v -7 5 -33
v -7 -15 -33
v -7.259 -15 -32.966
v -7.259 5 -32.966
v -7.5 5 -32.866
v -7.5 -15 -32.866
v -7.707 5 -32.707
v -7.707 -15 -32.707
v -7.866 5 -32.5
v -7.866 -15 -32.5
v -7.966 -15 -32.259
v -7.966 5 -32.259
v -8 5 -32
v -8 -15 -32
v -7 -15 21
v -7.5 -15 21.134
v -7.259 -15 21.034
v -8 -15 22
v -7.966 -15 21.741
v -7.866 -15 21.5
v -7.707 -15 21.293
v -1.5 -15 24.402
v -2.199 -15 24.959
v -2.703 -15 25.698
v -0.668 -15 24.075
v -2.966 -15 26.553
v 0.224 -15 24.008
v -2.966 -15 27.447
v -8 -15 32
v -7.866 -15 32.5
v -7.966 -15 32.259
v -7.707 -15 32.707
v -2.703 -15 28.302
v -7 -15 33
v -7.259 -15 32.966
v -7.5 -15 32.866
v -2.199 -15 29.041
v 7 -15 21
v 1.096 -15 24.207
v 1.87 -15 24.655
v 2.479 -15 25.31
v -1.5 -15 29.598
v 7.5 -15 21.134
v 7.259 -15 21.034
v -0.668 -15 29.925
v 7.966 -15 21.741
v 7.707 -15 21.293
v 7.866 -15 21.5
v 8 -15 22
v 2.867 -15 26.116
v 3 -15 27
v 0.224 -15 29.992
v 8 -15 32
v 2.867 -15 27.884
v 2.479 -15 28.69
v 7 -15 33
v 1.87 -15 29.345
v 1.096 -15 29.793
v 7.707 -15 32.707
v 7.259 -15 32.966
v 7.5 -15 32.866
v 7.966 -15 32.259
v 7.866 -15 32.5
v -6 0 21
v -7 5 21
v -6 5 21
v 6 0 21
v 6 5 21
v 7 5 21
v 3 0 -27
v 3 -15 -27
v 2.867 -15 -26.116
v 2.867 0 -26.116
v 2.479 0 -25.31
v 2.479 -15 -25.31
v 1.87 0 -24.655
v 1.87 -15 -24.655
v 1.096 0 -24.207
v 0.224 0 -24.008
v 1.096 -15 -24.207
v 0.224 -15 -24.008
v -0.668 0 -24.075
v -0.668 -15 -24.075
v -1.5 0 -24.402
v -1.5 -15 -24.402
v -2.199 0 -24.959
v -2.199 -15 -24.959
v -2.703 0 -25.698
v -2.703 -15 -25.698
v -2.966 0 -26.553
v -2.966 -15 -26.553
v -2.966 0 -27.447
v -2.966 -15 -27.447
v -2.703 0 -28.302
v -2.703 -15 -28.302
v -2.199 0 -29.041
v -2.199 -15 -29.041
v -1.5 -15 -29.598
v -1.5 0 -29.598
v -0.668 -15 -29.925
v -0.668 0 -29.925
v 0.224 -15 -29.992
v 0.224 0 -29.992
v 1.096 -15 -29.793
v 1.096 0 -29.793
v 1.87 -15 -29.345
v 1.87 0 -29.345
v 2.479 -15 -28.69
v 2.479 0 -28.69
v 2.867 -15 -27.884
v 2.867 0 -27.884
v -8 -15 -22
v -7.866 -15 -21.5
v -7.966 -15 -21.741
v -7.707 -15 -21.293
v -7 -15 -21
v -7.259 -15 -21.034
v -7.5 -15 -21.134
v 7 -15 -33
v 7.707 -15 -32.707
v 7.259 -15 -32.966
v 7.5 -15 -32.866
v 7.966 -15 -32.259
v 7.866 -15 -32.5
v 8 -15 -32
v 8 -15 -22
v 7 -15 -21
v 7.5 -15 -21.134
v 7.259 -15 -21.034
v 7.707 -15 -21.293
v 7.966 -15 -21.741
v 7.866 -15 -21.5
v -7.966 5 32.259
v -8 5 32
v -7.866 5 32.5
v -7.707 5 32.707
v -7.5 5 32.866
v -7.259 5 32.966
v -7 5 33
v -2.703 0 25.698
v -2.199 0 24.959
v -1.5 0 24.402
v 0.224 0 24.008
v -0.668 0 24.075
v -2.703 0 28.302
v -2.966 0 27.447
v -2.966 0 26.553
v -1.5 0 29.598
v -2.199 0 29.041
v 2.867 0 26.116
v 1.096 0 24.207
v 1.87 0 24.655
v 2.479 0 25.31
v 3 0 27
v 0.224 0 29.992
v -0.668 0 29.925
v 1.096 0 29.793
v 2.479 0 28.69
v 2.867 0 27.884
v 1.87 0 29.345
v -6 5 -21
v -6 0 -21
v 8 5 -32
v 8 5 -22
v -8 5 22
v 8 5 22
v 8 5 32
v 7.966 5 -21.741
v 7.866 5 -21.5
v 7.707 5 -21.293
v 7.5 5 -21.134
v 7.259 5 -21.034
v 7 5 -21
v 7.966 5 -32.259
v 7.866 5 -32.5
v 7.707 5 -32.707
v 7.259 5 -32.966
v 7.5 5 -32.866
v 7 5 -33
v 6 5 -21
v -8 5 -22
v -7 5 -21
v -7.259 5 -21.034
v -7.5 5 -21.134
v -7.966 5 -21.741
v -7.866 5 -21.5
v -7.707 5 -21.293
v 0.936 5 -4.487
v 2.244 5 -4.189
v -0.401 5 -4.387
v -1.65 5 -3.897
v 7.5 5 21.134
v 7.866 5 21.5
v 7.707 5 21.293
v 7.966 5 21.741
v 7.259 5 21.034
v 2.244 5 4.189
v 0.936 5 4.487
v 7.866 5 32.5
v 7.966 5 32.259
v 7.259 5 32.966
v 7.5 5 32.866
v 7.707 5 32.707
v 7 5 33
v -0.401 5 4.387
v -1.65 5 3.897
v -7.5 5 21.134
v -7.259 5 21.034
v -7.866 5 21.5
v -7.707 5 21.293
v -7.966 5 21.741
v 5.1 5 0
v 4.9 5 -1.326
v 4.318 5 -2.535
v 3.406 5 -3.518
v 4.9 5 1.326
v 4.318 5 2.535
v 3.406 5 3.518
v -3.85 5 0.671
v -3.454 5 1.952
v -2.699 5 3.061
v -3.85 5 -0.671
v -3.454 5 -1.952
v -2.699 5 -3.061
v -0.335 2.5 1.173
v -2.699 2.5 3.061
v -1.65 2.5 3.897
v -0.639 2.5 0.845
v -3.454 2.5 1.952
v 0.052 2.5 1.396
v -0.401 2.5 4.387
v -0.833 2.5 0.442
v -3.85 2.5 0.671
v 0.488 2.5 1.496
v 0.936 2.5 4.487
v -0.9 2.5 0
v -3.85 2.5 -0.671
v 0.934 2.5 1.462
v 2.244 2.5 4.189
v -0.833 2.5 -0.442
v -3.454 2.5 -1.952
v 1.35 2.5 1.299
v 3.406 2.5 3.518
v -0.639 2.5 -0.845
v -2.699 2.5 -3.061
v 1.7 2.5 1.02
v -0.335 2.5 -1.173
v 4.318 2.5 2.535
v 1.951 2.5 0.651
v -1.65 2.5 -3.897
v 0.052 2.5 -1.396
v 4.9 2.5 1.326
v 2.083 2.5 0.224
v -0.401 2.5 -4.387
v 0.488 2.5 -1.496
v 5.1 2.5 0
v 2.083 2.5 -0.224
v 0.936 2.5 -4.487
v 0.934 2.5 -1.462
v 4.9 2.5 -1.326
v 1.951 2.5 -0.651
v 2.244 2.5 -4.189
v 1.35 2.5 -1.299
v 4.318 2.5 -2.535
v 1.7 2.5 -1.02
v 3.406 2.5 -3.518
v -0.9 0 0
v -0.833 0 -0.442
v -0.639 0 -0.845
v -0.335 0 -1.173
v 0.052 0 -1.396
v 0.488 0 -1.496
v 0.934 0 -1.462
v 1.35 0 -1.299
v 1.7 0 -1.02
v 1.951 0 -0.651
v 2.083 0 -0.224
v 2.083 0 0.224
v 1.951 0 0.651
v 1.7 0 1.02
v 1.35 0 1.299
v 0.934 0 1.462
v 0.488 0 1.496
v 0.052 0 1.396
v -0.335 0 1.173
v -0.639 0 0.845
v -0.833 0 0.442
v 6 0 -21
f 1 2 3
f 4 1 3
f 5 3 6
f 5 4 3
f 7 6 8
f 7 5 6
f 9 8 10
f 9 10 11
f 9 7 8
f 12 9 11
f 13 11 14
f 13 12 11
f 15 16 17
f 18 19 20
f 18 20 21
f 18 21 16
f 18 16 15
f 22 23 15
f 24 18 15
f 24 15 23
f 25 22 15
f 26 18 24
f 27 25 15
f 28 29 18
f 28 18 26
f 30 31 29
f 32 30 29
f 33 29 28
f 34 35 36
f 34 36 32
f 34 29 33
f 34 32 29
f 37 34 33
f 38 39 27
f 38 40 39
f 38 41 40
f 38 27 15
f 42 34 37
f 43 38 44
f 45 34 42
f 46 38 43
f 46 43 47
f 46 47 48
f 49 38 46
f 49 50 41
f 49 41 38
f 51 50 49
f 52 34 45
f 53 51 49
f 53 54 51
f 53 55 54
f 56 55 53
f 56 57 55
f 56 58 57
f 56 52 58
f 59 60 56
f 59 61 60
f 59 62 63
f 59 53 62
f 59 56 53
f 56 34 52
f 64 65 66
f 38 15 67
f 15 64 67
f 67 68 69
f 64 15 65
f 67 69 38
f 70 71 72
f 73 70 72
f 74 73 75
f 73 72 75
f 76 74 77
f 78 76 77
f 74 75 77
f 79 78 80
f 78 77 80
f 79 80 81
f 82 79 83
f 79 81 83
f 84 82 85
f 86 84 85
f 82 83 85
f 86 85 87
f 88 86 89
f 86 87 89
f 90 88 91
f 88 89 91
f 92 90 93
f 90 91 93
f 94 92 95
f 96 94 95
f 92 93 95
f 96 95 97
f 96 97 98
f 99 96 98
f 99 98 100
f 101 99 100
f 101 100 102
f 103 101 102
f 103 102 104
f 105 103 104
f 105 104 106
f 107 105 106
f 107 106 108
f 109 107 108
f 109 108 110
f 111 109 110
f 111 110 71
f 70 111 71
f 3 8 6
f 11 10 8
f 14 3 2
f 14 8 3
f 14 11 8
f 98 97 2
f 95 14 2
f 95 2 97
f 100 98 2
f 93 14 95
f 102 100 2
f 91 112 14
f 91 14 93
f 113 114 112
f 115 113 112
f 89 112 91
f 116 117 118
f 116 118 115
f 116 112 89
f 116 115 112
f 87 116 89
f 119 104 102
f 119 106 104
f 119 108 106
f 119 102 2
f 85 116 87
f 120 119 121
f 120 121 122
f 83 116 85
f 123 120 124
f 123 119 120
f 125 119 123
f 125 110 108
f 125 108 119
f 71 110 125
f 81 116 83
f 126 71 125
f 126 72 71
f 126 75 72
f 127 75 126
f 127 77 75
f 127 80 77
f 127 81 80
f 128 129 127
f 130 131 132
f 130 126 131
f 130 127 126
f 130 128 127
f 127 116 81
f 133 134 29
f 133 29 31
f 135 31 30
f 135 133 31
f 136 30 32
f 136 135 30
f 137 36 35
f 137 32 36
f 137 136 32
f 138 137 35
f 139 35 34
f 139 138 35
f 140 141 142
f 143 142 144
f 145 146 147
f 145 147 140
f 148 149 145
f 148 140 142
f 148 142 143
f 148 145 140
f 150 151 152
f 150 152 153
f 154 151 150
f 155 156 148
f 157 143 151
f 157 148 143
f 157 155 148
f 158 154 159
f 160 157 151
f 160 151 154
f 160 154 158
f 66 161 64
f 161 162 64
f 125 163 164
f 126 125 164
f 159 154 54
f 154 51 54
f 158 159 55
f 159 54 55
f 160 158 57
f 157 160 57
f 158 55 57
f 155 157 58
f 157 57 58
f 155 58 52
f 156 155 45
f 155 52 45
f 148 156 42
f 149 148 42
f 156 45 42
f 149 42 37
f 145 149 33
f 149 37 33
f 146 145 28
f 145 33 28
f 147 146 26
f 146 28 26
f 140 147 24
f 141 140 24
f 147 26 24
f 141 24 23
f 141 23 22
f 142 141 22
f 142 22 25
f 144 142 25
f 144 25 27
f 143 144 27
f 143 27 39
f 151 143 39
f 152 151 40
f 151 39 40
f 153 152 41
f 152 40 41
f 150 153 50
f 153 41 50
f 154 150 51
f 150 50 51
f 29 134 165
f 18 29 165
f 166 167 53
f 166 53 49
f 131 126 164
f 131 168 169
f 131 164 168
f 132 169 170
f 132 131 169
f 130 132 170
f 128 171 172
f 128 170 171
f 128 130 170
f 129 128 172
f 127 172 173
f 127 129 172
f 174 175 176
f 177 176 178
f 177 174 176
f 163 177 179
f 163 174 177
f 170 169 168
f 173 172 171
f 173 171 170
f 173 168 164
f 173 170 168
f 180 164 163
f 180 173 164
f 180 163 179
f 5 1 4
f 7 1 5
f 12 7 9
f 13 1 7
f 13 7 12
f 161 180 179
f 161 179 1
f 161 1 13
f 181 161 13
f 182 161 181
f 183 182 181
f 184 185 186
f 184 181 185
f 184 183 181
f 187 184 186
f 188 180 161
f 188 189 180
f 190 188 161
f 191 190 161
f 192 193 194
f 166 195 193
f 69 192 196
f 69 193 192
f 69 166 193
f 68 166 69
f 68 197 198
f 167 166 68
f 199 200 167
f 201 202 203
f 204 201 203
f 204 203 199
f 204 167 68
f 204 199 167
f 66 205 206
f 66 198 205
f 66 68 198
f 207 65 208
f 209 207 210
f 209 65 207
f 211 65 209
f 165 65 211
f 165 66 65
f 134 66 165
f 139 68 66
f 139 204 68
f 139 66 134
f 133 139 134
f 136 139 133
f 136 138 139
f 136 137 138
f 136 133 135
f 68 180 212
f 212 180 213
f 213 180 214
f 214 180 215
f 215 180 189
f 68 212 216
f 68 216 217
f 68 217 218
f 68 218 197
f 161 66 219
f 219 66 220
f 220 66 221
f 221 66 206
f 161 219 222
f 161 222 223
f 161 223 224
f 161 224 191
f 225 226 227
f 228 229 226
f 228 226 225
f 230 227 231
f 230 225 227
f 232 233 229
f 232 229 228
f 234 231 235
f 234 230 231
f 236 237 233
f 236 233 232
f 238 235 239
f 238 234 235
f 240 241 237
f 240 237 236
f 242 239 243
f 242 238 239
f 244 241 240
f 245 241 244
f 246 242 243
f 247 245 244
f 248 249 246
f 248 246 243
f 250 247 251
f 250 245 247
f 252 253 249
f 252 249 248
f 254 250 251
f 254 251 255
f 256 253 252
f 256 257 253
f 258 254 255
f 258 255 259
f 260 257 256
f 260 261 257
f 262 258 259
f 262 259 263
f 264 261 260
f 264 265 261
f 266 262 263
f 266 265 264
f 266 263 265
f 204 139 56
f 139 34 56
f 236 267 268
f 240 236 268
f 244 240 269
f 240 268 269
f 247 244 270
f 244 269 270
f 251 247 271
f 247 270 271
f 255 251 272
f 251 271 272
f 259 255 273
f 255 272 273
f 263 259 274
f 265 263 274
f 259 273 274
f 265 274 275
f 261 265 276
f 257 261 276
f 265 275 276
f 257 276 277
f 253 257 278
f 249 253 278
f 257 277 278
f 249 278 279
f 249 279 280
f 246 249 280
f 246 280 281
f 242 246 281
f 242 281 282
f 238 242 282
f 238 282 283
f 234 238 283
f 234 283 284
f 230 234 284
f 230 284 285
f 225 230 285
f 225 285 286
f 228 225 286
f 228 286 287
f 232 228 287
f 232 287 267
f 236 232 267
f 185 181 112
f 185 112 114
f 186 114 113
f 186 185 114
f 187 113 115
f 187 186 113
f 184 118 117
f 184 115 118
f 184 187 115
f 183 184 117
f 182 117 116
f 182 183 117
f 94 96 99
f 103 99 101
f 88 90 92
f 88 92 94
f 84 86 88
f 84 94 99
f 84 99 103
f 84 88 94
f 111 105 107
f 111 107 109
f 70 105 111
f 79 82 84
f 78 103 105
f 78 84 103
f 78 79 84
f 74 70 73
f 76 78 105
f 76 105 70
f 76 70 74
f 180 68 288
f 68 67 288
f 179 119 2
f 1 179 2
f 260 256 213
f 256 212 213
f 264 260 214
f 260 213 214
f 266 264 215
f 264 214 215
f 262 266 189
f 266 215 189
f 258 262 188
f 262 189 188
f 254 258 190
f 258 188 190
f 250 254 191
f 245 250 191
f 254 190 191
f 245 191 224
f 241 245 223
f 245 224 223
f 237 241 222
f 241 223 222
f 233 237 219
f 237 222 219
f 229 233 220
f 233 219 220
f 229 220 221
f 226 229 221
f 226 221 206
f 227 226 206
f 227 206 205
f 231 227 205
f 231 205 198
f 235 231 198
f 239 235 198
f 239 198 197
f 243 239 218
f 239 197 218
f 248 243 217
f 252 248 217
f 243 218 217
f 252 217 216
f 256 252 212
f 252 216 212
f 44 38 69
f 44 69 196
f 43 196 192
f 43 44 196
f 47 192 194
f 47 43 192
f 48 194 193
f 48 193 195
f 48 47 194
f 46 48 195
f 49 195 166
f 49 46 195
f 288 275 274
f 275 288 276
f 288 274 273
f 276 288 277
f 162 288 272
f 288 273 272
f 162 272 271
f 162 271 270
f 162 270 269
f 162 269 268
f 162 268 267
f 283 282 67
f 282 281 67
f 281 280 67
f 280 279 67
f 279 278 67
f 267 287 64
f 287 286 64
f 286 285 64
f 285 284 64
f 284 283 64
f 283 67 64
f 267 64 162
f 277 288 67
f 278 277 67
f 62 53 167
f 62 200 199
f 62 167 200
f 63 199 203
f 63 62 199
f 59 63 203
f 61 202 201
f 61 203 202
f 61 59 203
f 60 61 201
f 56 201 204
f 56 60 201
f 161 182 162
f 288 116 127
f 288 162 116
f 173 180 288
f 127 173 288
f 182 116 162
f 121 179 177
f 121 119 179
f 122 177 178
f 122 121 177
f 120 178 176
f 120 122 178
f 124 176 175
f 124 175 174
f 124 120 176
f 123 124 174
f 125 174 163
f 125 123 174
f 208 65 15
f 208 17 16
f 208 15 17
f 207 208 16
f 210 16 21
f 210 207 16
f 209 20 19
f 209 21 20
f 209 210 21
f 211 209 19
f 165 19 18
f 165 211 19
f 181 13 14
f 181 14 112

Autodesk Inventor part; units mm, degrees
ref_plane "YZ Plane" through (0, 0, 0) normal (1, 0, 0) x (0, 1, 0)
ref_plane "XZ Plane" through (0, 0, 0) normal (0, 1, 0) x (-1, 0, 0)
ref_plane "XY Plane" through (0, 0, 0) normal (0, 0, 1) x (1, 0, 0)
sketch "Эскиз1" plane through (0, 0, 0) normal (0, 1, 0) x (-1, 0, 0)
  line L0 (-6, -33) -> (6, -33)
  line L1 (6, -33) -> (6, 33)
  line L2 (6, 33) -> (-6, 33)
  line L3 (-6, 33) -> (-6, -33)
  line L4 (-6, -33) -> (6, 33) construction
  line L5 (6, -33) -> (-6, 33) construction
  circle A0 centre (-0.6, 0) radius 1.5
  point P0 (0, 0)
  dimension "d0" = 12
  dimension "d1" = 66
  dimension "d21" = 3
  dimension "d22" = 0.6
  dimension "d23" = 33
extrude "Выдавливание1" add sketch "Эскиз1" along normal blind 5
sketch "Эскиз2" plane through (0, 0, 0) normal (0, -1, 0) x (1, 0, 0)
  line L0 (-3, -33) -> (-8, -33)
  line L1 (-8, -33) -> (-8, -21)
  line L2 (-8, -21) -> (-3, -21)
  line L3 (-3, -21) -> (-3, -33) construction
  line L4 (-6, -33) -> (-6, 33) projected
  line L5 (6, -33) -> (-6, -33) projected
  line L6 (-6, 0) -> (6, 0) construction
  line L7 (6, 33) -> (6, -33) projected
  line L8 (0, -33) -> (0, 33) construction
  line L9 (-6, 33) -> (6, 33) projected
  line L10 (-3, 33) -> (-8, 33)
  line L11 (-8, 33) -> (-8, 21)
  line L12 (-8, 21) -> (-3, 21)
  line L13 (-3, 21) -> (-3, 33) construction
  line L14 (3, -33) -> (8, -33)
  line L15 (8, -33) -> (8, -21)
  line L16 (8, -21) -> (3, -21)
  line L17 (3, -21) -> (3, -33) construction
  line L18 (8, 21) -> (3, 21)
  line L19 (8, 33) -> (8, 21)
  line L20 (3, 33) -> (8, 33)
  line L21 (3, 21) -> (3, 33) construction
  line L22 (-3, -33) -> (3, -33)
  line L23 (-3, -21) -> (3, -21)
  line L24 (-3, 21) -> (3, 21)
  line L25 (-3, 33) -> (3, 33)
  point P0 (0, 0)
  dimension "d5" = 2
  dimension "d6" = 5
  dimension "d7" = 12
  dimension "d8" = 0
extrude "Выдавливание2" add sketch "Эскиз2" along normal blind 15 and the other way blind 5 contours L0 L4 L2 L23 L16 L7 L5 | L0 L1 L2 L4 | L7 L16 L15 L14 | L12 L11 L10 L4 | L4 L9 L7 L18 L24 L12 | L7 L20 L19 L18
fillet "Сопряжение1" radius 1 8 edges at (-8, -5, -21) (-8, -5, 33) (-8, -5, 21) (8, -5, -21) (8, -5, -33) (-8, -5, -33) (8, -5, 33) (8, -5, 21)
sketch "Эскиз3" plane through (0, 5, 0) normal (0, 1, 0) x (1, 0, 0)
  circle A0 centre (0.6, 0) radius 1.5 projected
  circle A1 centre (0.6, 0) radius 4.5
  point P0 (0, 0)
  dimension "d24" = 9
extrude "Выдавливание3" cut sketch "Эскиз3" against normal blind 2.5
sketch "Эскиз4" plane through (0, -15, 0) normal (0, -1, 0) x (1, 0, 0)
  arc A0 (-7, -21) -> (-8, -22) centre (-7, -22) ccw projected
  arc A1 (7, -33) -> (8, -32) centre (7, -32) ccw projected
  line L0 (-7, -22) -> (7, -32) construction
  circle A2 centre (0, -27) radius 3
  line L1 (0, 0) -> (-6, 0) construction
  line L2 (-6, -21) -> (-6, 21) projected
  circle A3 centre (0, 27) radius 3
  dimension "d18" = 6
extrude "Выдавливание4" cut sketch "Эскиз4" against normal blind 15
equation "\"d23\" = 0.5 * d1"
properties part number "kick"
